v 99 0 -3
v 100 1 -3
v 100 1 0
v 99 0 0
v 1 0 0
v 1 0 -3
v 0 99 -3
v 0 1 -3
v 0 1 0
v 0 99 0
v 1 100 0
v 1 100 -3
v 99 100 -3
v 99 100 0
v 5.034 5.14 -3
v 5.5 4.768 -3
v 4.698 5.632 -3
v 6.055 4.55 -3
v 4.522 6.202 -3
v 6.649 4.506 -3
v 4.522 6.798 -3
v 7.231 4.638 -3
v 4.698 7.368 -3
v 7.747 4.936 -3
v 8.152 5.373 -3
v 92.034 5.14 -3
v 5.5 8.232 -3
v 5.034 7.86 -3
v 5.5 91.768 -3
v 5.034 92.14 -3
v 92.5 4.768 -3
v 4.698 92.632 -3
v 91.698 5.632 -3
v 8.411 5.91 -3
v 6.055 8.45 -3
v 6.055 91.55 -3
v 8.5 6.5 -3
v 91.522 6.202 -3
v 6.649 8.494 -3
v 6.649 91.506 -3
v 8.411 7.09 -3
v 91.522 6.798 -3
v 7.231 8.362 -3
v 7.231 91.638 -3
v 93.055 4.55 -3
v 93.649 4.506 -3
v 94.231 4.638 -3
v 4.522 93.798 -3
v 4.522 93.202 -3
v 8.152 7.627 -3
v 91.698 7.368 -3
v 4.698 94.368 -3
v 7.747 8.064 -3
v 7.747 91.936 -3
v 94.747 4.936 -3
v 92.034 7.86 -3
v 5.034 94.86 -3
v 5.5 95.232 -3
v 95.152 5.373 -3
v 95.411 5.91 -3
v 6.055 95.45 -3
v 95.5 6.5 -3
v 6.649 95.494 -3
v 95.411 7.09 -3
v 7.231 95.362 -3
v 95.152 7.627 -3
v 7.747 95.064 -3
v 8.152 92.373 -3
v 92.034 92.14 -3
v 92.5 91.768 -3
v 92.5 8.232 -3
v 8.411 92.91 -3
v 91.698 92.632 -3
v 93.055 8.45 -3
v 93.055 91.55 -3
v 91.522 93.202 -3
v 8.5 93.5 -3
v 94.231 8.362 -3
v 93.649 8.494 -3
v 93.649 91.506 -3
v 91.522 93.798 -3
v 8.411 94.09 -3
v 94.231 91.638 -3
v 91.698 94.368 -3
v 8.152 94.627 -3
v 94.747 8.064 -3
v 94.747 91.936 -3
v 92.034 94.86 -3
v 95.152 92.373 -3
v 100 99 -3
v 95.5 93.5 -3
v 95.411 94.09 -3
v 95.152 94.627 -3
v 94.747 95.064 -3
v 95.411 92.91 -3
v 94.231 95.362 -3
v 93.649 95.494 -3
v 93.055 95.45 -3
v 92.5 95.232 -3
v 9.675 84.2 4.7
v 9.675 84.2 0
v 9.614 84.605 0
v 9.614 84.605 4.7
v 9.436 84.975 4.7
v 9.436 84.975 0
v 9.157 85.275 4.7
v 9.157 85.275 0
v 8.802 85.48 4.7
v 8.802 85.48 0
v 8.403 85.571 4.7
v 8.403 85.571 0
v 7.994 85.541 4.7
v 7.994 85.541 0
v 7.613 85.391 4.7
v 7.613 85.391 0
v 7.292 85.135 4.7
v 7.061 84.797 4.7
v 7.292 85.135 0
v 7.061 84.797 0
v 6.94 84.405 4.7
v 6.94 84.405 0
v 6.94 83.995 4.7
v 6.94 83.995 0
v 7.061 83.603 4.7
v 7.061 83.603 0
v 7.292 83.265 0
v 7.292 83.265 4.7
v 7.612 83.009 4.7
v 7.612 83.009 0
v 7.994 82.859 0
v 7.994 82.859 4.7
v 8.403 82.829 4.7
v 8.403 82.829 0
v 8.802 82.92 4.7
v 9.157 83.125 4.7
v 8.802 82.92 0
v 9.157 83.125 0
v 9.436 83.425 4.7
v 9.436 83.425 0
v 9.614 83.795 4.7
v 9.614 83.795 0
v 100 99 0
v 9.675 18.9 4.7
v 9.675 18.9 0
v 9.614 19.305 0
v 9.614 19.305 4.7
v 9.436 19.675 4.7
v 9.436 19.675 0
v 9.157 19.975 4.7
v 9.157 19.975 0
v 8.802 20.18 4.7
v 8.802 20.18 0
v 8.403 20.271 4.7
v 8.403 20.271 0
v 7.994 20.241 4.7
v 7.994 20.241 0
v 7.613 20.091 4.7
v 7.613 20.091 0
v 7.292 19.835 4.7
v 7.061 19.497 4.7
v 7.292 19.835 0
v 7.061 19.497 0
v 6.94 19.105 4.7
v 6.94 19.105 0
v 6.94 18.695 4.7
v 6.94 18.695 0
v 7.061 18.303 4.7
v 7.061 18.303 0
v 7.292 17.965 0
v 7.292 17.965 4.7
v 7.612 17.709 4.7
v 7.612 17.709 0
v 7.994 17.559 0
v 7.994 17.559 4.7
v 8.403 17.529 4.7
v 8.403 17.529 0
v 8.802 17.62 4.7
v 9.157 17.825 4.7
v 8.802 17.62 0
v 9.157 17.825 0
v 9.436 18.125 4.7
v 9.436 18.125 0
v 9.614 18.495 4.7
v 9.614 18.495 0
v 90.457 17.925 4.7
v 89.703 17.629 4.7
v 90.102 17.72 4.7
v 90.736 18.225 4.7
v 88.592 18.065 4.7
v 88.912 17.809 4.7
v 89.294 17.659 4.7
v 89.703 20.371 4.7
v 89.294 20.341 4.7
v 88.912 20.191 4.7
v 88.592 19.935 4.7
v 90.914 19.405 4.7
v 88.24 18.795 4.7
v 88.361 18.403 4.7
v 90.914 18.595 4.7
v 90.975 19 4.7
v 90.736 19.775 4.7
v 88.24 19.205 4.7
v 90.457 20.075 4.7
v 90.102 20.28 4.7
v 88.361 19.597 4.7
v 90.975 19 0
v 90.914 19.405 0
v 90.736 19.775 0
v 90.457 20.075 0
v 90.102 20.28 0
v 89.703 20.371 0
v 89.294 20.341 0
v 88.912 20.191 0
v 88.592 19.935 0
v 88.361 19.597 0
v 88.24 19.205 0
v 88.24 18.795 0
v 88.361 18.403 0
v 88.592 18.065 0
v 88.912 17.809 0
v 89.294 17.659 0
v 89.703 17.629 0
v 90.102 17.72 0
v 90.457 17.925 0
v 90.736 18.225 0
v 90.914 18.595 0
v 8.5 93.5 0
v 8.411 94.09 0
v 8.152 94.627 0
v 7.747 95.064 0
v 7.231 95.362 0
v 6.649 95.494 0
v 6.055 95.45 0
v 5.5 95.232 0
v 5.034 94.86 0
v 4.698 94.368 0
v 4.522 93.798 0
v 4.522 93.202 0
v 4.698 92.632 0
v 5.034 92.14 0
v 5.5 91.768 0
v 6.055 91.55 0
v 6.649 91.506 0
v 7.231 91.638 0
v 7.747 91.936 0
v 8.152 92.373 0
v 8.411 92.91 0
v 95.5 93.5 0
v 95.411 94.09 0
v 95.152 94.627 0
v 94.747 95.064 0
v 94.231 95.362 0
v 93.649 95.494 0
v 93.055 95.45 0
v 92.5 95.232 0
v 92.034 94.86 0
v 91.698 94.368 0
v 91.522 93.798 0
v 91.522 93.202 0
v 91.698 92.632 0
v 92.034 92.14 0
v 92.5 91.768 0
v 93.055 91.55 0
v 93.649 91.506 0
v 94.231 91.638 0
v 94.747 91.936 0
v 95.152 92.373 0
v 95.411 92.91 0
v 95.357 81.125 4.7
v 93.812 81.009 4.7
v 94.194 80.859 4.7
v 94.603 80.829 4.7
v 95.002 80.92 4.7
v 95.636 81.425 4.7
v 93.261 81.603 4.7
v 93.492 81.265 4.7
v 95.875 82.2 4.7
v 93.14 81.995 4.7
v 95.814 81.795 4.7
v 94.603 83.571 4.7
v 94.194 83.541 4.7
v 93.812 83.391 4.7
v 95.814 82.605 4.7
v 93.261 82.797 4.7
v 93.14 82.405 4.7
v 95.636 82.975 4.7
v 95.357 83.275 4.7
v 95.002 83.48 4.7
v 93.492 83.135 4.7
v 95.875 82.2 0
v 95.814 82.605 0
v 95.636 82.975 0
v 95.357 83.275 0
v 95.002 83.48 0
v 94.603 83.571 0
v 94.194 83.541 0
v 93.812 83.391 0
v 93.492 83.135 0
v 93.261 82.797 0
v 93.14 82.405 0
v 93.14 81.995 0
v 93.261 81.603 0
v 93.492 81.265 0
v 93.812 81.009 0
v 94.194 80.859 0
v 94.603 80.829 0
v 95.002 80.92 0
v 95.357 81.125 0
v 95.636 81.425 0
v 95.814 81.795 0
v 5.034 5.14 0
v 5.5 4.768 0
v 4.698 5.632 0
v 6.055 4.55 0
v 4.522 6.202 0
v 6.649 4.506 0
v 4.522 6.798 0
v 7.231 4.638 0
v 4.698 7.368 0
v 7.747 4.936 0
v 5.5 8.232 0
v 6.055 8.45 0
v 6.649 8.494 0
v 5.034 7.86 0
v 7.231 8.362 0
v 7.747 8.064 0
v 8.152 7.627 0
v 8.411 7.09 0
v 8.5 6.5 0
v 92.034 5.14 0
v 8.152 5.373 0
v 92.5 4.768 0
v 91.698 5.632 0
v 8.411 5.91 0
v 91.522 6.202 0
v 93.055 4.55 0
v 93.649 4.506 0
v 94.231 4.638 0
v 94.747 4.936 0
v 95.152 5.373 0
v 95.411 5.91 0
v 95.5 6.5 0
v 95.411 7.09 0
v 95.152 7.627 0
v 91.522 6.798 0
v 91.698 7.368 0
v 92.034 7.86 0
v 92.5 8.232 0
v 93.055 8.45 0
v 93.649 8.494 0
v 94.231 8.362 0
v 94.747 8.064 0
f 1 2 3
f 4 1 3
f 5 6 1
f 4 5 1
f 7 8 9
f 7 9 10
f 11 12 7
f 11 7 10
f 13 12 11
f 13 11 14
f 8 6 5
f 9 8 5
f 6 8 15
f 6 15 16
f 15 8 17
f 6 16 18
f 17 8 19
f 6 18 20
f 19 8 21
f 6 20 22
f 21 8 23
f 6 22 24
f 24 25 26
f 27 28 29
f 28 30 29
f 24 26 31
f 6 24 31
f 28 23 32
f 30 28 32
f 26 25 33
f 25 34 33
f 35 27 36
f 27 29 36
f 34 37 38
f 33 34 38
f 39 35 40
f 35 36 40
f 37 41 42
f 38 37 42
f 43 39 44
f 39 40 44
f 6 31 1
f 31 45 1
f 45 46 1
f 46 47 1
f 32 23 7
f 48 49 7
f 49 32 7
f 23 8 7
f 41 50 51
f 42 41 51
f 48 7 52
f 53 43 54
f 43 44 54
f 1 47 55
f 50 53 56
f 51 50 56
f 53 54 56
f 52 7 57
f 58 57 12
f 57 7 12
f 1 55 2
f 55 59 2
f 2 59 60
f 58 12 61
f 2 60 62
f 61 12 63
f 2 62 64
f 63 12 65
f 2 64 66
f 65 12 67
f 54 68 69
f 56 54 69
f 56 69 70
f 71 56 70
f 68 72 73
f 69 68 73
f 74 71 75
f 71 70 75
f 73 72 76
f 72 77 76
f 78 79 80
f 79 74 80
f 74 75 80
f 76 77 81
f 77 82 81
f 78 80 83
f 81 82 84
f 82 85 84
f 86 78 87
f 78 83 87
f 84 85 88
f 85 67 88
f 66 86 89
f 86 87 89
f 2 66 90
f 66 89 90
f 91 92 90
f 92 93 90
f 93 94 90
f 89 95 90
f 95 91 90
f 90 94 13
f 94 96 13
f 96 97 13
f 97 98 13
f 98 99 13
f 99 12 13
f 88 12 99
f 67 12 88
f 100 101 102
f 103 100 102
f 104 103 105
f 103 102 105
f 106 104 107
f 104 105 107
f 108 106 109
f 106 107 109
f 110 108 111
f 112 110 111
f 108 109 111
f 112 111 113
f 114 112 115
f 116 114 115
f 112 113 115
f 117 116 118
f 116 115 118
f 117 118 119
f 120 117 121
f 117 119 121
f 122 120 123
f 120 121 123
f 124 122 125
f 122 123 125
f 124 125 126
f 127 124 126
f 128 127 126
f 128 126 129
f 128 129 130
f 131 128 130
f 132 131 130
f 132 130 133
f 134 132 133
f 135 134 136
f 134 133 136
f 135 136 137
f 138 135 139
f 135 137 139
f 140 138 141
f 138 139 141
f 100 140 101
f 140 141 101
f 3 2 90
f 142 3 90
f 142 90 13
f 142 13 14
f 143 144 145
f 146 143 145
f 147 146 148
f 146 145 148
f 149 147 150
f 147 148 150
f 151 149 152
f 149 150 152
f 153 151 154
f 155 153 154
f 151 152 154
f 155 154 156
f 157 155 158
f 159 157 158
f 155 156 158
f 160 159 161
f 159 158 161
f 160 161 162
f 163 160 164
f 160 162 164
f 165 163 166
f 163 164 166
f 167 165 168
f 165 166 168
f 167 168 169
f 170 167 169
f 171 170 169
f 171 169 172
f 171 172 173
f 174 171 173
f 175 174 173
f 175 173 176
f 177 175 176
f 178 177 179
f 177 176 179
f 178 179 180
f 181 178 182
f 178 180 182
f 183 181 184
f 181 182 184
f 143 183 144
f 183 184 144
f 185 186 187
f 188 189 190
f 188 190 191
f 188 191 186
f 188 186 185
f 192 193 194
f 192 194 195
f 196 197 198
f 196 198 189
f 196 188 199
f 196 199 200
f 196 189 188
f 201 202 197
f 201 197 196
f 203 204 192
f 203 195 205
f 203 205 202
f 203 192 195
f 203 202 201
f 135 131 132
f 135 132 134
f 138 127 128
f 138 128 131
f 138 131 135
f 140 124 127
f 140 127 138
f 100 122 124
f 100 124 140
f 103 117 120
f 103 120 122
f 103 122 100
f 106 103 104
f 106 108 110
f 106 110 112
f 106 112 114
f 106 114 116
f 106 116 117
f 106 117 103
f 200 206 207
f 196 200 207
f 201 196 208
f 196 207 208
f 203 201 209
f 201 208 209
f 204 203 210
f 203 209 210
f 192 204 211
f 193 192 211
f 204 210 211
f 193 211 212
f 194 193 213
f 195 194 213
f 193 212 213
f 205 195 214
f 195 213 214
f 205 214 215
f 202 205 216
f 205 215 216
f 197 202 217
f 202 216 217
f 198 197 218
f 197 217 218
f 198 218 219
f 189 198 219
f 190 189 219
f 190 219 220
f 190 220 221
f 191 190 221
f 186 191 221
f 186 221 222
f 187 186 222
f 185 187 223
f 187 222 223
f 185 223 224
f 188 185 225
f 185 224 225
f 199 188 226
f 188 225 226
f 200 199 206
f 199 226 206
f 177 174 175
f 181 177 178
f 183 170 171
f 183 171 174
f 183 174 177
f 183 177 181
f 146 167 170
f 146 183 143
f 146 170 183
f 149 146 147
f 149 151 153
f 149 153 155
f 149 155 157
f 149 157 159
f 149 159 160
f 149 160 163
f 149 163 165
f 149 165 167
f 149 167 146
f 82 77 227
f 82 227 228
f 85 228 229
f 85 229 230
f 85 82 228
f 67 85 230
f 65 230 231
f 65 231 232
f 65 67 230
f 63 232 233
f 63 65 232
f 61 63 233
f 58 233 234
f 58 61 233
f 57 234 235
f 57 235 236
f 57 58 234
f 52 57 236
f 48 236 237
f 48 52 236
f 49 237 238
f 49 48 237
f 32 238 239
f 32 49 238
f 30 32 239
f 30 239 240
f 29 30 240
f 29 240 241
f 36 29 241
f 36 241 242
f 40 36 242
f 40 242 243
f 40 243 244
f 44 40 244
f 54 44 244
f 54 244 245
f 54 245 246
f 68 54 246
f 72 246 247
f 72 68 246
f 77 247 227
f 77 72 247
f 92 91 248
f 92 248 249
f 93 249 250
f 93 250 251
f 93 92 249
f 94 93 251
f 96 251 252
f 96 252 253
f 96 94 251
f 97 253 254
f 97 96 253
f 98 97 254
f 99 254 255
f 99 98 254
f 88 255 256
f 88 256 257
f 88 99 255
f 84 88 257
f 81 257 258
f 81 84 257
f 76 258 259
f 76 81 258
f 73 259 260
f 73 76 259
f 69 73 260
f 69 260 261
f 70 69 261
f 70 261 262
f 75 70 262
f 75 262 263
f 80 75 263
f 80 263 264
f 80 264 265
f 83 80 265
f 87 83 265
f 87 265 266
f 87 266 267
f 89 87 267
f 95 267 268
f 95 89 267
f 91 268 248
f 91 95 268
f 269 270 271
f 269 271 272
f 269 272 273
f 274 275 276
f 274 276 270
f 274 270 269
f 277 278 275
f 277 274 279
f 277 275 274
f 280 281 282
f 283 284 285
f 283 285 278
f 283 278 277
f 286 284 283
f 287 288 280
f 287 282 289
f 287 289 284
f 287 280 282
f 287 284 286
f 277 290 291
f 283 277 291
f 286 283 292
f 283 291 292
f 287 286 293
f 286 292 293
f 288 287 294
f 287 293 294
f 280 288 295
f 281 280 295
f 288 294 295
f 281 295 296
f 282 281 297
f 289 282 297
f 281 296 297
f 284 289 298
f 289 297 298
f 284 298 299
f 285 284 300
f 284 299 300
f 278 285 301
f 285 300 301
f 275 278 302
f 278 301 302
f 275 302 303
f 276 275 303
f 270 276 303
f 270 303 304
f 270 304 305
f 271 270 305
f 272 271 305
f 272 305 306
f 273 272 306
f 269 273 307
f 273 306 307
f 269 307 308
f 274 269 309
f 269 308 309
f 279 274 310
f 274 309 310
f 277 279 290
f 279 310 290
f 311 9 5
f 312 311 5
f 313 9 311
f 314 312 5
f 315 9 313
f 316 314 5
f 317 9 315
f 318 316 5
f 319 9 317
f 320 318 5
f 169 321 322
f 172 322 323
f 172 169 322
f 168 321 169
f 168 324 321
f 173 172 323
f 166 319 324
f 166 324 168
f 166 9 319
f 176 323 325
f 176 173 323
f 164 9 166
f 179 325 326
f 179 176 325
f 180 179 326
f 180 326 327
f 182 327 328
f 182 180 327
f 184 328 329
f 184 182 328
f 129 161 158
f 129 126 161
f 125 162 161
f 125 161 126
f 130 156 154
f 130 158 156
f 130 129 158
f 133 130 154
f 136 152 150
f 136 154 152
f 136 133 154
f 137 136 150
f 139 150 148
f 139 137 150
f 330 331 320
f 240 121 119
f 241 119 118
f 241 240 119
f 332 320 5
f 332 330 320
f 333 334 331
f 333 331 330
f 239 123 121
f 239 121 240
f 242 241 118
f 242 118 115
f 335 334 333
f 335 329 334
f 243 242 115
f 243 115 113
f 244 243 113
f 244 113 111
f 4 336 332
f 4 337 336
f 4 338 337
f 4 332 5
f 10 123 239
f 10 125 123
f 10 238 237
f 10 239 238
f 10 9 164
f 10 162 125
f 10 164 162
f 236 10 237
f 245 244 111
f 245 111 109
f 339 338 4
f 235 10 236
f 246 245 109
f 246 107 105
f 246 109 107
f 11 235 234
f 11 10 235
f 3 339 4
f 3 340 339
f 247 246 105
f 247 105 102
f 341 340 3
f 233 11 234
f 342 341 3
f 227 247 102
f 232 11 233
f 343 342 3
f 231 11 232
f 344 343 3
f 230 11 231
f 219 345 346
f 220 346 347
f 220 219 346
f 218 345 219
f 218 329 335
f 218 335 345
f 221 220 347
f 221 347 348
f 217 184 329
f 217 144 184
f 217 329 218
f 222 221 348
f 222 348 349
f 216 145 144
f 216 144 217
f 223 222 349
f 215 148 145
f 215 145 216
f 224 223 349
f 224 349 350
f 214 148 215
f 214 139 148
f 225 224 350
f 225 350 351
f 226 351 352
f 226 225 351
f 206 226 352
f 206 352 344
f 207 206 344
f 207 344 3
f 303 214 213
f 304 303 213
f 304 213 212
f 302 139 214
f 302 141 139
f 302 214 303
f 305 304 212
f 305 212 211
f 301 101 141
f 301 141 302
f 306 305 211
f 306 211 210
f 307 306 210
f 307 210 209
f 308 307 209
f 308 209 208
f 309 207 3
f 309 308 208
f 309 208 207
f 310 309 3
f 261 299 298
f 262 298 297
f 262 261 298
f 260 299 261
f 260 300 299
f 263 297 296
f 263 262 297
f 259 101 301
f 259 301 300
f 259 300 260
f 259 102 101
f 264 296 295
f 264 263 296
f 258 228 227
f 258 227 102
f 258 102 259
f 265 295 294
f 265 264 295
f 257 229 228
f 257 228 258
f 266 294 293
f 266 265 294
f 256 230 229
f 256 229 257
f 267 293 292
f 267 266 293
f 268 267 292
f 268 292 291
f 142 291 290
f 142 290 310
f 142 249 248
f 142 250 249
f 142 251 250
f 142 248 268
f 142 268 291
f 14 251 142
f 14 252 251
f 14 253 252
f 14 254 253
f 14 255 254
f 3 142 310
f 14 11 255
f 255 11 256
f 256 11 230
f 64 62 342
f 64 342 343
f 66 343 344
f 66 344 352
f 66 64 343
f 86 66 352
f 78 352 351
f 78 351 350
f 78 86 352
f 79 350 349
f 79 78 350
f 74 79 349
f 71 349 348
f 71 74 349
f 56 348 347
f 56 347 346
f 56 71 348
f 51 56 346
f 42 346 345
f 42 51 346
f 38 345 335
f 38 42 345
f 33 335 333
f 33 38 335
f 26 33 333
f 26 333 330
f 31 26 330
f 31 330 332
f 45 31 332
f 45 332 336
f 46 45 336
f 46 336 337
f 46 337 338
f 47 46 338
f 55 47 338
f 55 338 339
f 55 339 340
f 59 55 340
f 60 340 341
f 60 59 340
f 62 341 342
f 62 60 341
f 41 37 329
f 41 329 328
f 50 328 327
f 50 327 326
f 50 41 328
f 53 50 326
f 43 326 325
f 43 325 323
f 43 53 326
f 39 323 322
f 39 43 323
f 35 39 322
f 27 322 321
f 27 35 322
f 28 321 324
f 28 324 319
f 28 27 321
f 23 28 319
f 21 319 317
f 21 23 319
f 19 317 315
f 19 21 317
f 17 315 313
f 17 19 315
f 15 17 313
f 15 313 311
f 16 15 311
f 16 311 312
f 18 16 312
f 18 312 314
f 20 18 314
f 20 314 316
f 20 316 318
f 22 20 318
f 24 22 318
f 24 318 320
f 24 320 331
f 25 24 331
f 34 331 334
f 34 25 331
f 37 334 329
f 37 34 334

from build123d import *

# Parameters (mm, degrees)
CYLINDER004_R     = 1.375
CYLINDER004_DEPTH = 4.7
CYLINDER005_R     = 1.375
CYLINDER005_DEPTH = 4.7
CYLINDER006_R     = 1.375
CYLINDER006_DEPTH = 4.7
CYLINDER007_R     = 1.375
CYLINDER007_DEPTH = 4.7
CYLINDER_R        = 2
CYLINDER_DEPTH    = 3
CYLINDER001_R     = 2
CYLINDER001_DEPTH = 3
CYLINDER002_R     = 2
CYLINDER002_DEPTH = 3
CYLINDER003_R     = 2
CYLINDER003_DEPTH = 3
BOX_W             = 100
BOX_H             = 100
BOX_DEPTH         = 3
CHAMFER_SIZE      = 1


with BuildPart() as main_ata_board_mounting_screws:
    # Cylinder004 → Cylinder004 (new body)
    with BuildSketch(Plane(origin=(8.3, 18.9, 3), x_dir=(1, 0, 0), z_dir=(0, 0, 1))):
        Circle(CYLINDER004_R)
    extrude(amount=CYLINDER004_DEPTH)


with BuildPart() as main_ata_board_mounting_screws001:
    # Cylinder005 → Cylinder005 (new body)
    with BuildSketch(Plane(origin=(8.3, 84.2, 3), x_dir=(1, 0, 0), z_dir=(0, 0, 1))):
        Circle(CYLINDER005_R)
    extrude(amount=CYLINDER005_DEPTH)


with BuildPart() as main_ata_board_mounting_screws002:
    # Cylinder006 → Cylinder006 (new body)
    with BuildSketch(Plane(origin=(89.6, 19, 3), x_dir=(1, 0, 0), z_dir=(0, 0, 1))):
        Circle(CYLINDER006_R)
    extrude(amount=CYLINDER006_DEPTH)


with BuildPart() as ata_board_mounting_screw_stubs:
    # Cylinder007 → Cylinder007 (new body)
    with BuildSketch(Plane(origin=(94.5, 82.2, 3), x_dir=(1, 0, 0), z_dir=(0, 0, 1))):
        Circle(CYLINDER007_R)
    extrude(amount=CYLINDER007_DEPTH)

    # Fusion001: union Main ATA Board Mounting Screws, Main ATA Board Mounting Screws001, Main ATA Board Mounting Screws002
    add(main_ata_board_mounting_screws.part)
    add(main_ata_board_mounting_screws001.part)
    add(main_ata_board_mounting_screws002.part)


with BuildPart() as f_1u_post_holes:
    # Cylinder → Cylinder (new body)
    with BuildSketch(Plane(origin=(6.5, 6.5, 0), x_dir=(1, 0, 0), z_dir=(0, 0, 1))):
        Circle(CYLINDER_R)
    extrude(amount=CYLINDER_DEPTH)


with BuildPart() as f_1u_post_holes001:
    # Cylinder001 → Cylinder001 (new body)
    with BuildSketch(Plane(origin=(93.5, 6.5, 0), x_dir=(1, 0, 0), z_dir=(0, 0, 1))):
        Circle(CYLINDER001_R)
    extrude(amount=CYLINDER001_DEPTH)


with BuildPart() as f_1u_post_holes002:
    # Cylinder002 → Cylinder002 (new body)
    with BuildSketch(Plane(origin=(93.5, 93.5, 0), x_dir=(1, 0, 0), z_dir=(0, 0, 1))):
        Circle(CYLINDER002_R)
    extrude(amount=CYLINDER002_DEPTH)


with BuildPart() as f_1u_post_holes_assembly:
    # Cylinder003 → Cylinder003 (new body)
    with BuildSketch(Plane(origin=(6.5, 93.5, 0), x_dir=(1, 0, 0), z_dir=(0, 0, 1))):
        Circle(CYLINDER003_R)
    extrude(amount=CYLINDER003_DEPTH)

    # Fusion: union 1U Post Holes, 1U Post Holes001, 1U Post Holes002
    add(f_1u_post_holes.part)
    add(f_1u_post_holes001.part)
    add(f_1u_post_holes002.part)


with BuildPart() as mounting_ata_aluminium:
    # Box → Box (new body)
    with BuildSketch(Plane.XY):
        with Locations((50, 50)):
            Rectangle(BOX_W, BOX_H)
    extrude(amount=BOX_DEPTH)

    # Cut: cut 1U post holes assembly
    add(f_1u_post_holes_assembly.part, mode=Mode.SUBTRACT)

    # Chamfer
    chamfer_edges = [mounting_ata_aluminium.edges().sort_by_distance(p)[0] for p in [
        (0, 0, 1.5),
        (0, 100, 1.5),
        (100, 0, 1.5),
        (100, 100, 1.5),
    ]]
    chamfer(chamfer_edges, length=CHAMFER_SIZE)

    # Fusion002: union ATA Board mounting screw stubs
    add(ata_board_mounting_screw_stubs.part)


with BuildPart() as mounting_ata_aluminium_1:
    # Fusion002 placement: moved
    add(mounting_ata_aluminium.part.moved(Location((0, 0, -3))))


solid = mounting_ata_aluminium_1.part
